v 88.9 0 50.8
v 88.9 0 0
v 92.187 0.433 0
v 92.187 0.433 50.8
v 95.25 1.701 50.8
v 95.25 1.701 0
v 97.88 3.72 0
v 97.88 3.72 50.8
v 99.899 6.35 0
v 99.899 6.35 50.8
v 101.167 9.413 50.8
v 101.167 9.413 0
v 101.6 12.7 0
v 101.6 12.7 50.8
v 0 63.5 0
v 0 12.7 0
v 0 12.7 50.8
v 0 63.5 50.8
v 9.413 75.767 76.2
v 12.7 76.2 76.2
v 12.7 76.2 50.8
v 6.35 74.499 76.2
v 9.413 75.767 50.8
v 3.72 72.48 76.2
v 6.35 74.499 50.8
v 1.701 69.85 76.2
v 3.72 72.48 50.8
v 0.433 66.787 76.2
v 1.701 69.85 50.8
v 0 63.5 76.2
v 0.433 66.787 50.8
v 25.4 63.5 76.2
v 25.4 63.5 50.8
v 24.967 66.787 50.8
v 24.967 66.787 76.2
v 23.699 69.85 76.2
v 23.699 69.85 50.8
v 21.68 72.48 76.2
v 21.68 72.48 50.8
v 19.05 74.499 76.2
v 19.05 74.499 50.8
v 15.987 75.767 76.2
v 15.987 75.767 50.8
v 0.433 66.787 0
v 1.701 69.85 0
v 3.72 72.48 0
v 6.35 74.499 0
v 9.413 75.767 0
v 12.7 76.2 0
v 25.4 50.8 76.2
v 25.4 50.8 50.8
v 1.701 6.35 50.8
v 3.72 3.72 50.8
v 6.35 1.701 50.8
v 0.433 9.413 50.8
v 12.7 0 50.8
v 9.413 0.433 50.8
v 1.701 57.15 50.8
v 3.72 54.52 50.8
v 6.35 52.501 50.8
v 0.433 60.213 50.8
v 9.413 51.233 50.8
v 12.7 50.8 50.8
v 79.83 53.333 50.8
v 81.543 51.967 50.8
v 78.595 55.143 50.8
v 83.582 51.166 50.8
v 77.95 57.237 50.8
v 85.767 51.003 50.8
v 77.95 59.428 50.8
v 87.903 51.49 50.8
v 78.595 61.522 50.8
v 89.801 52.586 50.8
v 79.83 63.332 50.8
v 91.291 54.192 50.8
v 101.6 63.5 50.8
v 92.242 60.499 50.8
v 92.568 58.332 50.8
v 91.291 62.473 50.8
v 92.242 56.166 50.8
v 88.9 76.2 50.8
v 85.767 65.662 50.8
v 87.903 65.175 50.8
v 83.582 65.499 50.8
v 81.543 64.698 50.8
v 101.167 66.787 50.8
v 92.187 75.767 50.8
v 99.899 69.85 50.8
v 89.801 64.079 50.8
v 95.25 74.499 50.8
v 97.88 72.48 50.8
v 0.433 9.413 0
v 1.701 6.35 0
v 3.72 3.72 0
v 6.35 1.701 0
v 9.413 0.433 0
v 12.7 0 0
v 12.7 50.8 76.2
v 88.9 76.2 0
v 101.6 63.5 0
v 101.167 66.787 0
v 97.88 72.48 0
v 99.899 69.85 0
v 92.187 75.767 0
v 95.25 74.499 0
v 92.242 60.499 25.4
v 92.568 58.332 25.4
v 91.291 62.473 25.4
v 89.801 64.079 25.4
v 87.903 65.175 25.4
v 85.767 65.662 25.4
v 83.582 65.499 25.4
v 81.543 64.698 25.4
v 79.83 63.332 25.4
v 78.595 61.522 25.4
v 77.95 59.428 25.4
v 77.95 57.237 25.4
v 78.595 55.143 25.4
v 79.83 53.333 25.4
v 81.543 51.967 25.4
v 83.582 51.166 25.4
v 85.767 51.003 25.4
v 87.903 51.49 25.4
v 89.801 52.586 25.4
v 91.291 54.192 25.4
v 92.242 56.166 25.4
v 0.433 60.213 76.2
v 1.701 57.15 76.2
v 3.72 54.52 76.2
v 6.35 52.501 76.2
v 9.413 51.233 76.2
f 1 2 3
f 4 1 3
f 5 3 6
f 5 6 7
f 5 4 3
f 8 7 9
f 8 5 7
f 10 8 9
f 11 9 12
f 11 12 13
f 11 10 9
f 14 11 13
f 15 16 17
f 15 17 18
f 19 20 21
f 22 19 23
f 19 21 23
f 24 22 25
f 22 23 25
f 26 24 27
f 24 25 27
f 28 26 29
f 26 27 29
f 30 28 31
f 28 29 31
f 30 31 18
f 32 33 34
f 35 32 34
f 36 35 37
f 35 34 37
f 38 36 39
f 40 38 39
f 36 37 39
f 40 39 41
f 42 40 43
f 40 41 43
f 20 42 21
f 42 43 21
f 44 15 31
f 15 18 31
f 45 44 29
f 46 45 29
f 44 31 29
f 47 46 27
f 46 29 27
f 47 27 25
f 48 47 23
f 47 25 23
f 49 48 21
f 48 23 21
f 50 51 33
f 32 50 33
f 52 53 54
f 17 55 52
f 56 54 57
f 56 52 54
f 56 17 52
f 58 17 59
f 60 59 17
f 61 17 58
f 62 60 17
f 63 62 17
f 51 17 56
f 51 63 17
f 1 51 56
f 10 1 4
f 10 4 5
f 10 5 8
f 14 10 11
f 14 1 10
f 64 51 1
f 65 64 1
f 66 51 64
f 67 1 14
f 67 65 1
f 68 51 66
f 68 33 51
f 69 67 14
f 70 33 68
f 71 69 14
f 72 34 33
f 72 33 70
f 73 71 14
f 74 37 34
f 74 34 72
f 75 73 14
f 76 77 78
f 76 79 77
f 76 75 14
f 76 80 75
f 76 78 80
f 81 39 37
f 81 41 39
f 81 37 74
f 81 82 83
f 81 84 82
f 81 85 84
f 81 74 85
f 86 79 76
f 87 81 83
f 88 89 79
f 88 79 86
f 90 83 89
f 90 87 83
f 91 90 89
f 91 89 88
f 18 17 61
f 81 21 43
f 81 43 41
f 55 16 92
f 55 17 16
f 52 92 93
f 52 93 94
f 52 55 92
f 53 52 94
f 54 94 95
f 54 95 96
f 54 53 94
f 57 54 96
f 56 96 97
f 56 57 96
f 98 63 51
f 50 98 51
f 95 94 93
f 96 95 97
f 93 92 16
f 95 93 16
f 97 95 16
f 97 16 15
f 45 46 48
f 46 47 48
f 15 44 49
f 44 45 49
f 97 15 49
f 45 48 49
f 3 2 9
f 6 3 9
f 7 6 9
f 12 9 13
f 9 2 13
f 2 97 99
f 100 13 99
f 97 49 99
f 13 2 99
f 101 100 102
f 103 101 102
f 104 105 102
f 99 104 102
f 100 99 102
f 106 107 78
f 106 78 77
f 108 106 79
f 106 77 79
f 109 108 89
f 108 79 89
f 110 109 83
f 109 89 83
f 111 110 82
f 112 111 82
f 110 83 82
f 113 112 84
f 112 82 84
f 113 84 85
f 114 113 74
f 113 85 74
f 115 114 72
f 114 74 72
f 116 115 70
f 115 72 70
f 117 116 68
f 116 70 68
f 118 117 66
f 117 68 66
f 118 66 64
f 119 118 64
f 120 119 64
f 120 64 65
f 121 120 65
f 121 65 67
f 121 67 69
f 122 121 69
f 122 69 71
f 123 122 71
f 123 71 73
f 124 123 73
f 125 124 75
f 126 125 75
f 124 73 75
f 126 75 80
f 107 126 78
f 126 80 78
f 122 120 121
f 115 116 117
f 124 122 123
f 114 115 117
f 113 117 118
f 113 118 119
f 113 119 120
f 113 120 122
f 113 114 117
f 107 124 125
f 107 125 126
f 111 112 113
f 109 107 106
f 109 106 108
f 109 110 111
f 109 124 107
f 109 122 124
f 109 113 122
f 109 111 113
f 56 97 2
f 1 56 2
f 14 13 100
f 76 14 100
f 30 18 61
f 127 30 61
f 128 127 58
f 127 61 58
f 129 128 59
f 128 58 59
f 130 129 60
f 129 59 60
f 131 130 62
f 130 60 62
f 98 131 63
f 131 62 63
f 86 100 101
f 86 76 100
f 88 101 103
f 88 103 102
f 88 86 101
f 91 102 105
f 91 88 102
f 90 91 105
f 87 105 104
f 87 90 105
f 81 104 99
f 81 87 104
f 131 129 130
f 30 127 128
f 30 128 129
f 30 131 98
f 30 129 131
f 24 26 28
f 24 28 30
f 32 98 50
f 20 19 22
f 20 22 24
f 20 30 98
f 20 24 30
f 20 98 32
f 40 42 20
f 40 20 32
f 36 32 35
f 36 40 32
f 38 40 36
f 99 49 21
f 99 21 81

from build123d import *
from build123d import SkipClean  # not in build123d's __all__

# Parameters (mm, degrees)
F0_W      = 101.6
F0_H      = 76.2
F1_DEPTH  = 50.8
F2_R      = 12.7
F4_DEPTH  = 25.4
F9_R      = 7.3504137181
F10_DEPTH = 25.4


# Not quite as in the source:
# - after a boolean that leaves OpenCascade's solid faulty, fix() repairs it
# - the program builds the solid bodies; features that only make, move or delete a surface that nothing else refers to are left out


with BuildPart() as f1:
    # F0 (on Top) → F1 (new body)
    with BuildSketch(Plane.XY):
        with Locations((50.8, 38.1)):
            Rectangle(F0_W, F0_H)
    extrude(amount=F1_DEPTH)

    # F2
    f2_edges = [f1.edges().sort_by_distance(p)[0] for p in [
        (0, 0, 25.4),
        (101.6, 0, 25.4),
        (101.6, 76.2, 25.4),
        (0, 76.2, 25.4),
    ]]
    fillet(f2_edges, radius=F2_R)

    # F3 (on face) → F4 (join)
    with BuildSketch(Plane.XY.offset(50.8)):
        with BuildLine():
            ThreePointArc((0, 63.5), (3.7197438789, 54.5197438789), (12.7, 50.8))
            Line((12.7, 50.8), (25.4, 50.8))
            Line((25.4, 50.8), (25.4, 63.5))
            ThreePointArc((25.4, 63.5), (21.6802561211, 72.4802561211), (12.7, 76.2))
            ThreePointArc((12.7, 76.2), (3.7197438789, 72.4802561211), (0, 63.5))
        make_face()
    with SkipClean():  # cleaning this boolean's faces spoils the solid; the shape is the same uncleaned
        extrude(amount=F4_DEPTH)

    # F9 (on face) → F10 (cut)
    with BuildSketch(Plane.XY.offset(50.8)):
        with Locations((85.2179154754, 58.332465589)):
            Circle(F9_R)
    extrude(amount=-F10_DEPTH, mode=Mode.SUBTRACT)

    add(f1.part.fix(), mode=Mode.REPLACE)


solid = f1.part
